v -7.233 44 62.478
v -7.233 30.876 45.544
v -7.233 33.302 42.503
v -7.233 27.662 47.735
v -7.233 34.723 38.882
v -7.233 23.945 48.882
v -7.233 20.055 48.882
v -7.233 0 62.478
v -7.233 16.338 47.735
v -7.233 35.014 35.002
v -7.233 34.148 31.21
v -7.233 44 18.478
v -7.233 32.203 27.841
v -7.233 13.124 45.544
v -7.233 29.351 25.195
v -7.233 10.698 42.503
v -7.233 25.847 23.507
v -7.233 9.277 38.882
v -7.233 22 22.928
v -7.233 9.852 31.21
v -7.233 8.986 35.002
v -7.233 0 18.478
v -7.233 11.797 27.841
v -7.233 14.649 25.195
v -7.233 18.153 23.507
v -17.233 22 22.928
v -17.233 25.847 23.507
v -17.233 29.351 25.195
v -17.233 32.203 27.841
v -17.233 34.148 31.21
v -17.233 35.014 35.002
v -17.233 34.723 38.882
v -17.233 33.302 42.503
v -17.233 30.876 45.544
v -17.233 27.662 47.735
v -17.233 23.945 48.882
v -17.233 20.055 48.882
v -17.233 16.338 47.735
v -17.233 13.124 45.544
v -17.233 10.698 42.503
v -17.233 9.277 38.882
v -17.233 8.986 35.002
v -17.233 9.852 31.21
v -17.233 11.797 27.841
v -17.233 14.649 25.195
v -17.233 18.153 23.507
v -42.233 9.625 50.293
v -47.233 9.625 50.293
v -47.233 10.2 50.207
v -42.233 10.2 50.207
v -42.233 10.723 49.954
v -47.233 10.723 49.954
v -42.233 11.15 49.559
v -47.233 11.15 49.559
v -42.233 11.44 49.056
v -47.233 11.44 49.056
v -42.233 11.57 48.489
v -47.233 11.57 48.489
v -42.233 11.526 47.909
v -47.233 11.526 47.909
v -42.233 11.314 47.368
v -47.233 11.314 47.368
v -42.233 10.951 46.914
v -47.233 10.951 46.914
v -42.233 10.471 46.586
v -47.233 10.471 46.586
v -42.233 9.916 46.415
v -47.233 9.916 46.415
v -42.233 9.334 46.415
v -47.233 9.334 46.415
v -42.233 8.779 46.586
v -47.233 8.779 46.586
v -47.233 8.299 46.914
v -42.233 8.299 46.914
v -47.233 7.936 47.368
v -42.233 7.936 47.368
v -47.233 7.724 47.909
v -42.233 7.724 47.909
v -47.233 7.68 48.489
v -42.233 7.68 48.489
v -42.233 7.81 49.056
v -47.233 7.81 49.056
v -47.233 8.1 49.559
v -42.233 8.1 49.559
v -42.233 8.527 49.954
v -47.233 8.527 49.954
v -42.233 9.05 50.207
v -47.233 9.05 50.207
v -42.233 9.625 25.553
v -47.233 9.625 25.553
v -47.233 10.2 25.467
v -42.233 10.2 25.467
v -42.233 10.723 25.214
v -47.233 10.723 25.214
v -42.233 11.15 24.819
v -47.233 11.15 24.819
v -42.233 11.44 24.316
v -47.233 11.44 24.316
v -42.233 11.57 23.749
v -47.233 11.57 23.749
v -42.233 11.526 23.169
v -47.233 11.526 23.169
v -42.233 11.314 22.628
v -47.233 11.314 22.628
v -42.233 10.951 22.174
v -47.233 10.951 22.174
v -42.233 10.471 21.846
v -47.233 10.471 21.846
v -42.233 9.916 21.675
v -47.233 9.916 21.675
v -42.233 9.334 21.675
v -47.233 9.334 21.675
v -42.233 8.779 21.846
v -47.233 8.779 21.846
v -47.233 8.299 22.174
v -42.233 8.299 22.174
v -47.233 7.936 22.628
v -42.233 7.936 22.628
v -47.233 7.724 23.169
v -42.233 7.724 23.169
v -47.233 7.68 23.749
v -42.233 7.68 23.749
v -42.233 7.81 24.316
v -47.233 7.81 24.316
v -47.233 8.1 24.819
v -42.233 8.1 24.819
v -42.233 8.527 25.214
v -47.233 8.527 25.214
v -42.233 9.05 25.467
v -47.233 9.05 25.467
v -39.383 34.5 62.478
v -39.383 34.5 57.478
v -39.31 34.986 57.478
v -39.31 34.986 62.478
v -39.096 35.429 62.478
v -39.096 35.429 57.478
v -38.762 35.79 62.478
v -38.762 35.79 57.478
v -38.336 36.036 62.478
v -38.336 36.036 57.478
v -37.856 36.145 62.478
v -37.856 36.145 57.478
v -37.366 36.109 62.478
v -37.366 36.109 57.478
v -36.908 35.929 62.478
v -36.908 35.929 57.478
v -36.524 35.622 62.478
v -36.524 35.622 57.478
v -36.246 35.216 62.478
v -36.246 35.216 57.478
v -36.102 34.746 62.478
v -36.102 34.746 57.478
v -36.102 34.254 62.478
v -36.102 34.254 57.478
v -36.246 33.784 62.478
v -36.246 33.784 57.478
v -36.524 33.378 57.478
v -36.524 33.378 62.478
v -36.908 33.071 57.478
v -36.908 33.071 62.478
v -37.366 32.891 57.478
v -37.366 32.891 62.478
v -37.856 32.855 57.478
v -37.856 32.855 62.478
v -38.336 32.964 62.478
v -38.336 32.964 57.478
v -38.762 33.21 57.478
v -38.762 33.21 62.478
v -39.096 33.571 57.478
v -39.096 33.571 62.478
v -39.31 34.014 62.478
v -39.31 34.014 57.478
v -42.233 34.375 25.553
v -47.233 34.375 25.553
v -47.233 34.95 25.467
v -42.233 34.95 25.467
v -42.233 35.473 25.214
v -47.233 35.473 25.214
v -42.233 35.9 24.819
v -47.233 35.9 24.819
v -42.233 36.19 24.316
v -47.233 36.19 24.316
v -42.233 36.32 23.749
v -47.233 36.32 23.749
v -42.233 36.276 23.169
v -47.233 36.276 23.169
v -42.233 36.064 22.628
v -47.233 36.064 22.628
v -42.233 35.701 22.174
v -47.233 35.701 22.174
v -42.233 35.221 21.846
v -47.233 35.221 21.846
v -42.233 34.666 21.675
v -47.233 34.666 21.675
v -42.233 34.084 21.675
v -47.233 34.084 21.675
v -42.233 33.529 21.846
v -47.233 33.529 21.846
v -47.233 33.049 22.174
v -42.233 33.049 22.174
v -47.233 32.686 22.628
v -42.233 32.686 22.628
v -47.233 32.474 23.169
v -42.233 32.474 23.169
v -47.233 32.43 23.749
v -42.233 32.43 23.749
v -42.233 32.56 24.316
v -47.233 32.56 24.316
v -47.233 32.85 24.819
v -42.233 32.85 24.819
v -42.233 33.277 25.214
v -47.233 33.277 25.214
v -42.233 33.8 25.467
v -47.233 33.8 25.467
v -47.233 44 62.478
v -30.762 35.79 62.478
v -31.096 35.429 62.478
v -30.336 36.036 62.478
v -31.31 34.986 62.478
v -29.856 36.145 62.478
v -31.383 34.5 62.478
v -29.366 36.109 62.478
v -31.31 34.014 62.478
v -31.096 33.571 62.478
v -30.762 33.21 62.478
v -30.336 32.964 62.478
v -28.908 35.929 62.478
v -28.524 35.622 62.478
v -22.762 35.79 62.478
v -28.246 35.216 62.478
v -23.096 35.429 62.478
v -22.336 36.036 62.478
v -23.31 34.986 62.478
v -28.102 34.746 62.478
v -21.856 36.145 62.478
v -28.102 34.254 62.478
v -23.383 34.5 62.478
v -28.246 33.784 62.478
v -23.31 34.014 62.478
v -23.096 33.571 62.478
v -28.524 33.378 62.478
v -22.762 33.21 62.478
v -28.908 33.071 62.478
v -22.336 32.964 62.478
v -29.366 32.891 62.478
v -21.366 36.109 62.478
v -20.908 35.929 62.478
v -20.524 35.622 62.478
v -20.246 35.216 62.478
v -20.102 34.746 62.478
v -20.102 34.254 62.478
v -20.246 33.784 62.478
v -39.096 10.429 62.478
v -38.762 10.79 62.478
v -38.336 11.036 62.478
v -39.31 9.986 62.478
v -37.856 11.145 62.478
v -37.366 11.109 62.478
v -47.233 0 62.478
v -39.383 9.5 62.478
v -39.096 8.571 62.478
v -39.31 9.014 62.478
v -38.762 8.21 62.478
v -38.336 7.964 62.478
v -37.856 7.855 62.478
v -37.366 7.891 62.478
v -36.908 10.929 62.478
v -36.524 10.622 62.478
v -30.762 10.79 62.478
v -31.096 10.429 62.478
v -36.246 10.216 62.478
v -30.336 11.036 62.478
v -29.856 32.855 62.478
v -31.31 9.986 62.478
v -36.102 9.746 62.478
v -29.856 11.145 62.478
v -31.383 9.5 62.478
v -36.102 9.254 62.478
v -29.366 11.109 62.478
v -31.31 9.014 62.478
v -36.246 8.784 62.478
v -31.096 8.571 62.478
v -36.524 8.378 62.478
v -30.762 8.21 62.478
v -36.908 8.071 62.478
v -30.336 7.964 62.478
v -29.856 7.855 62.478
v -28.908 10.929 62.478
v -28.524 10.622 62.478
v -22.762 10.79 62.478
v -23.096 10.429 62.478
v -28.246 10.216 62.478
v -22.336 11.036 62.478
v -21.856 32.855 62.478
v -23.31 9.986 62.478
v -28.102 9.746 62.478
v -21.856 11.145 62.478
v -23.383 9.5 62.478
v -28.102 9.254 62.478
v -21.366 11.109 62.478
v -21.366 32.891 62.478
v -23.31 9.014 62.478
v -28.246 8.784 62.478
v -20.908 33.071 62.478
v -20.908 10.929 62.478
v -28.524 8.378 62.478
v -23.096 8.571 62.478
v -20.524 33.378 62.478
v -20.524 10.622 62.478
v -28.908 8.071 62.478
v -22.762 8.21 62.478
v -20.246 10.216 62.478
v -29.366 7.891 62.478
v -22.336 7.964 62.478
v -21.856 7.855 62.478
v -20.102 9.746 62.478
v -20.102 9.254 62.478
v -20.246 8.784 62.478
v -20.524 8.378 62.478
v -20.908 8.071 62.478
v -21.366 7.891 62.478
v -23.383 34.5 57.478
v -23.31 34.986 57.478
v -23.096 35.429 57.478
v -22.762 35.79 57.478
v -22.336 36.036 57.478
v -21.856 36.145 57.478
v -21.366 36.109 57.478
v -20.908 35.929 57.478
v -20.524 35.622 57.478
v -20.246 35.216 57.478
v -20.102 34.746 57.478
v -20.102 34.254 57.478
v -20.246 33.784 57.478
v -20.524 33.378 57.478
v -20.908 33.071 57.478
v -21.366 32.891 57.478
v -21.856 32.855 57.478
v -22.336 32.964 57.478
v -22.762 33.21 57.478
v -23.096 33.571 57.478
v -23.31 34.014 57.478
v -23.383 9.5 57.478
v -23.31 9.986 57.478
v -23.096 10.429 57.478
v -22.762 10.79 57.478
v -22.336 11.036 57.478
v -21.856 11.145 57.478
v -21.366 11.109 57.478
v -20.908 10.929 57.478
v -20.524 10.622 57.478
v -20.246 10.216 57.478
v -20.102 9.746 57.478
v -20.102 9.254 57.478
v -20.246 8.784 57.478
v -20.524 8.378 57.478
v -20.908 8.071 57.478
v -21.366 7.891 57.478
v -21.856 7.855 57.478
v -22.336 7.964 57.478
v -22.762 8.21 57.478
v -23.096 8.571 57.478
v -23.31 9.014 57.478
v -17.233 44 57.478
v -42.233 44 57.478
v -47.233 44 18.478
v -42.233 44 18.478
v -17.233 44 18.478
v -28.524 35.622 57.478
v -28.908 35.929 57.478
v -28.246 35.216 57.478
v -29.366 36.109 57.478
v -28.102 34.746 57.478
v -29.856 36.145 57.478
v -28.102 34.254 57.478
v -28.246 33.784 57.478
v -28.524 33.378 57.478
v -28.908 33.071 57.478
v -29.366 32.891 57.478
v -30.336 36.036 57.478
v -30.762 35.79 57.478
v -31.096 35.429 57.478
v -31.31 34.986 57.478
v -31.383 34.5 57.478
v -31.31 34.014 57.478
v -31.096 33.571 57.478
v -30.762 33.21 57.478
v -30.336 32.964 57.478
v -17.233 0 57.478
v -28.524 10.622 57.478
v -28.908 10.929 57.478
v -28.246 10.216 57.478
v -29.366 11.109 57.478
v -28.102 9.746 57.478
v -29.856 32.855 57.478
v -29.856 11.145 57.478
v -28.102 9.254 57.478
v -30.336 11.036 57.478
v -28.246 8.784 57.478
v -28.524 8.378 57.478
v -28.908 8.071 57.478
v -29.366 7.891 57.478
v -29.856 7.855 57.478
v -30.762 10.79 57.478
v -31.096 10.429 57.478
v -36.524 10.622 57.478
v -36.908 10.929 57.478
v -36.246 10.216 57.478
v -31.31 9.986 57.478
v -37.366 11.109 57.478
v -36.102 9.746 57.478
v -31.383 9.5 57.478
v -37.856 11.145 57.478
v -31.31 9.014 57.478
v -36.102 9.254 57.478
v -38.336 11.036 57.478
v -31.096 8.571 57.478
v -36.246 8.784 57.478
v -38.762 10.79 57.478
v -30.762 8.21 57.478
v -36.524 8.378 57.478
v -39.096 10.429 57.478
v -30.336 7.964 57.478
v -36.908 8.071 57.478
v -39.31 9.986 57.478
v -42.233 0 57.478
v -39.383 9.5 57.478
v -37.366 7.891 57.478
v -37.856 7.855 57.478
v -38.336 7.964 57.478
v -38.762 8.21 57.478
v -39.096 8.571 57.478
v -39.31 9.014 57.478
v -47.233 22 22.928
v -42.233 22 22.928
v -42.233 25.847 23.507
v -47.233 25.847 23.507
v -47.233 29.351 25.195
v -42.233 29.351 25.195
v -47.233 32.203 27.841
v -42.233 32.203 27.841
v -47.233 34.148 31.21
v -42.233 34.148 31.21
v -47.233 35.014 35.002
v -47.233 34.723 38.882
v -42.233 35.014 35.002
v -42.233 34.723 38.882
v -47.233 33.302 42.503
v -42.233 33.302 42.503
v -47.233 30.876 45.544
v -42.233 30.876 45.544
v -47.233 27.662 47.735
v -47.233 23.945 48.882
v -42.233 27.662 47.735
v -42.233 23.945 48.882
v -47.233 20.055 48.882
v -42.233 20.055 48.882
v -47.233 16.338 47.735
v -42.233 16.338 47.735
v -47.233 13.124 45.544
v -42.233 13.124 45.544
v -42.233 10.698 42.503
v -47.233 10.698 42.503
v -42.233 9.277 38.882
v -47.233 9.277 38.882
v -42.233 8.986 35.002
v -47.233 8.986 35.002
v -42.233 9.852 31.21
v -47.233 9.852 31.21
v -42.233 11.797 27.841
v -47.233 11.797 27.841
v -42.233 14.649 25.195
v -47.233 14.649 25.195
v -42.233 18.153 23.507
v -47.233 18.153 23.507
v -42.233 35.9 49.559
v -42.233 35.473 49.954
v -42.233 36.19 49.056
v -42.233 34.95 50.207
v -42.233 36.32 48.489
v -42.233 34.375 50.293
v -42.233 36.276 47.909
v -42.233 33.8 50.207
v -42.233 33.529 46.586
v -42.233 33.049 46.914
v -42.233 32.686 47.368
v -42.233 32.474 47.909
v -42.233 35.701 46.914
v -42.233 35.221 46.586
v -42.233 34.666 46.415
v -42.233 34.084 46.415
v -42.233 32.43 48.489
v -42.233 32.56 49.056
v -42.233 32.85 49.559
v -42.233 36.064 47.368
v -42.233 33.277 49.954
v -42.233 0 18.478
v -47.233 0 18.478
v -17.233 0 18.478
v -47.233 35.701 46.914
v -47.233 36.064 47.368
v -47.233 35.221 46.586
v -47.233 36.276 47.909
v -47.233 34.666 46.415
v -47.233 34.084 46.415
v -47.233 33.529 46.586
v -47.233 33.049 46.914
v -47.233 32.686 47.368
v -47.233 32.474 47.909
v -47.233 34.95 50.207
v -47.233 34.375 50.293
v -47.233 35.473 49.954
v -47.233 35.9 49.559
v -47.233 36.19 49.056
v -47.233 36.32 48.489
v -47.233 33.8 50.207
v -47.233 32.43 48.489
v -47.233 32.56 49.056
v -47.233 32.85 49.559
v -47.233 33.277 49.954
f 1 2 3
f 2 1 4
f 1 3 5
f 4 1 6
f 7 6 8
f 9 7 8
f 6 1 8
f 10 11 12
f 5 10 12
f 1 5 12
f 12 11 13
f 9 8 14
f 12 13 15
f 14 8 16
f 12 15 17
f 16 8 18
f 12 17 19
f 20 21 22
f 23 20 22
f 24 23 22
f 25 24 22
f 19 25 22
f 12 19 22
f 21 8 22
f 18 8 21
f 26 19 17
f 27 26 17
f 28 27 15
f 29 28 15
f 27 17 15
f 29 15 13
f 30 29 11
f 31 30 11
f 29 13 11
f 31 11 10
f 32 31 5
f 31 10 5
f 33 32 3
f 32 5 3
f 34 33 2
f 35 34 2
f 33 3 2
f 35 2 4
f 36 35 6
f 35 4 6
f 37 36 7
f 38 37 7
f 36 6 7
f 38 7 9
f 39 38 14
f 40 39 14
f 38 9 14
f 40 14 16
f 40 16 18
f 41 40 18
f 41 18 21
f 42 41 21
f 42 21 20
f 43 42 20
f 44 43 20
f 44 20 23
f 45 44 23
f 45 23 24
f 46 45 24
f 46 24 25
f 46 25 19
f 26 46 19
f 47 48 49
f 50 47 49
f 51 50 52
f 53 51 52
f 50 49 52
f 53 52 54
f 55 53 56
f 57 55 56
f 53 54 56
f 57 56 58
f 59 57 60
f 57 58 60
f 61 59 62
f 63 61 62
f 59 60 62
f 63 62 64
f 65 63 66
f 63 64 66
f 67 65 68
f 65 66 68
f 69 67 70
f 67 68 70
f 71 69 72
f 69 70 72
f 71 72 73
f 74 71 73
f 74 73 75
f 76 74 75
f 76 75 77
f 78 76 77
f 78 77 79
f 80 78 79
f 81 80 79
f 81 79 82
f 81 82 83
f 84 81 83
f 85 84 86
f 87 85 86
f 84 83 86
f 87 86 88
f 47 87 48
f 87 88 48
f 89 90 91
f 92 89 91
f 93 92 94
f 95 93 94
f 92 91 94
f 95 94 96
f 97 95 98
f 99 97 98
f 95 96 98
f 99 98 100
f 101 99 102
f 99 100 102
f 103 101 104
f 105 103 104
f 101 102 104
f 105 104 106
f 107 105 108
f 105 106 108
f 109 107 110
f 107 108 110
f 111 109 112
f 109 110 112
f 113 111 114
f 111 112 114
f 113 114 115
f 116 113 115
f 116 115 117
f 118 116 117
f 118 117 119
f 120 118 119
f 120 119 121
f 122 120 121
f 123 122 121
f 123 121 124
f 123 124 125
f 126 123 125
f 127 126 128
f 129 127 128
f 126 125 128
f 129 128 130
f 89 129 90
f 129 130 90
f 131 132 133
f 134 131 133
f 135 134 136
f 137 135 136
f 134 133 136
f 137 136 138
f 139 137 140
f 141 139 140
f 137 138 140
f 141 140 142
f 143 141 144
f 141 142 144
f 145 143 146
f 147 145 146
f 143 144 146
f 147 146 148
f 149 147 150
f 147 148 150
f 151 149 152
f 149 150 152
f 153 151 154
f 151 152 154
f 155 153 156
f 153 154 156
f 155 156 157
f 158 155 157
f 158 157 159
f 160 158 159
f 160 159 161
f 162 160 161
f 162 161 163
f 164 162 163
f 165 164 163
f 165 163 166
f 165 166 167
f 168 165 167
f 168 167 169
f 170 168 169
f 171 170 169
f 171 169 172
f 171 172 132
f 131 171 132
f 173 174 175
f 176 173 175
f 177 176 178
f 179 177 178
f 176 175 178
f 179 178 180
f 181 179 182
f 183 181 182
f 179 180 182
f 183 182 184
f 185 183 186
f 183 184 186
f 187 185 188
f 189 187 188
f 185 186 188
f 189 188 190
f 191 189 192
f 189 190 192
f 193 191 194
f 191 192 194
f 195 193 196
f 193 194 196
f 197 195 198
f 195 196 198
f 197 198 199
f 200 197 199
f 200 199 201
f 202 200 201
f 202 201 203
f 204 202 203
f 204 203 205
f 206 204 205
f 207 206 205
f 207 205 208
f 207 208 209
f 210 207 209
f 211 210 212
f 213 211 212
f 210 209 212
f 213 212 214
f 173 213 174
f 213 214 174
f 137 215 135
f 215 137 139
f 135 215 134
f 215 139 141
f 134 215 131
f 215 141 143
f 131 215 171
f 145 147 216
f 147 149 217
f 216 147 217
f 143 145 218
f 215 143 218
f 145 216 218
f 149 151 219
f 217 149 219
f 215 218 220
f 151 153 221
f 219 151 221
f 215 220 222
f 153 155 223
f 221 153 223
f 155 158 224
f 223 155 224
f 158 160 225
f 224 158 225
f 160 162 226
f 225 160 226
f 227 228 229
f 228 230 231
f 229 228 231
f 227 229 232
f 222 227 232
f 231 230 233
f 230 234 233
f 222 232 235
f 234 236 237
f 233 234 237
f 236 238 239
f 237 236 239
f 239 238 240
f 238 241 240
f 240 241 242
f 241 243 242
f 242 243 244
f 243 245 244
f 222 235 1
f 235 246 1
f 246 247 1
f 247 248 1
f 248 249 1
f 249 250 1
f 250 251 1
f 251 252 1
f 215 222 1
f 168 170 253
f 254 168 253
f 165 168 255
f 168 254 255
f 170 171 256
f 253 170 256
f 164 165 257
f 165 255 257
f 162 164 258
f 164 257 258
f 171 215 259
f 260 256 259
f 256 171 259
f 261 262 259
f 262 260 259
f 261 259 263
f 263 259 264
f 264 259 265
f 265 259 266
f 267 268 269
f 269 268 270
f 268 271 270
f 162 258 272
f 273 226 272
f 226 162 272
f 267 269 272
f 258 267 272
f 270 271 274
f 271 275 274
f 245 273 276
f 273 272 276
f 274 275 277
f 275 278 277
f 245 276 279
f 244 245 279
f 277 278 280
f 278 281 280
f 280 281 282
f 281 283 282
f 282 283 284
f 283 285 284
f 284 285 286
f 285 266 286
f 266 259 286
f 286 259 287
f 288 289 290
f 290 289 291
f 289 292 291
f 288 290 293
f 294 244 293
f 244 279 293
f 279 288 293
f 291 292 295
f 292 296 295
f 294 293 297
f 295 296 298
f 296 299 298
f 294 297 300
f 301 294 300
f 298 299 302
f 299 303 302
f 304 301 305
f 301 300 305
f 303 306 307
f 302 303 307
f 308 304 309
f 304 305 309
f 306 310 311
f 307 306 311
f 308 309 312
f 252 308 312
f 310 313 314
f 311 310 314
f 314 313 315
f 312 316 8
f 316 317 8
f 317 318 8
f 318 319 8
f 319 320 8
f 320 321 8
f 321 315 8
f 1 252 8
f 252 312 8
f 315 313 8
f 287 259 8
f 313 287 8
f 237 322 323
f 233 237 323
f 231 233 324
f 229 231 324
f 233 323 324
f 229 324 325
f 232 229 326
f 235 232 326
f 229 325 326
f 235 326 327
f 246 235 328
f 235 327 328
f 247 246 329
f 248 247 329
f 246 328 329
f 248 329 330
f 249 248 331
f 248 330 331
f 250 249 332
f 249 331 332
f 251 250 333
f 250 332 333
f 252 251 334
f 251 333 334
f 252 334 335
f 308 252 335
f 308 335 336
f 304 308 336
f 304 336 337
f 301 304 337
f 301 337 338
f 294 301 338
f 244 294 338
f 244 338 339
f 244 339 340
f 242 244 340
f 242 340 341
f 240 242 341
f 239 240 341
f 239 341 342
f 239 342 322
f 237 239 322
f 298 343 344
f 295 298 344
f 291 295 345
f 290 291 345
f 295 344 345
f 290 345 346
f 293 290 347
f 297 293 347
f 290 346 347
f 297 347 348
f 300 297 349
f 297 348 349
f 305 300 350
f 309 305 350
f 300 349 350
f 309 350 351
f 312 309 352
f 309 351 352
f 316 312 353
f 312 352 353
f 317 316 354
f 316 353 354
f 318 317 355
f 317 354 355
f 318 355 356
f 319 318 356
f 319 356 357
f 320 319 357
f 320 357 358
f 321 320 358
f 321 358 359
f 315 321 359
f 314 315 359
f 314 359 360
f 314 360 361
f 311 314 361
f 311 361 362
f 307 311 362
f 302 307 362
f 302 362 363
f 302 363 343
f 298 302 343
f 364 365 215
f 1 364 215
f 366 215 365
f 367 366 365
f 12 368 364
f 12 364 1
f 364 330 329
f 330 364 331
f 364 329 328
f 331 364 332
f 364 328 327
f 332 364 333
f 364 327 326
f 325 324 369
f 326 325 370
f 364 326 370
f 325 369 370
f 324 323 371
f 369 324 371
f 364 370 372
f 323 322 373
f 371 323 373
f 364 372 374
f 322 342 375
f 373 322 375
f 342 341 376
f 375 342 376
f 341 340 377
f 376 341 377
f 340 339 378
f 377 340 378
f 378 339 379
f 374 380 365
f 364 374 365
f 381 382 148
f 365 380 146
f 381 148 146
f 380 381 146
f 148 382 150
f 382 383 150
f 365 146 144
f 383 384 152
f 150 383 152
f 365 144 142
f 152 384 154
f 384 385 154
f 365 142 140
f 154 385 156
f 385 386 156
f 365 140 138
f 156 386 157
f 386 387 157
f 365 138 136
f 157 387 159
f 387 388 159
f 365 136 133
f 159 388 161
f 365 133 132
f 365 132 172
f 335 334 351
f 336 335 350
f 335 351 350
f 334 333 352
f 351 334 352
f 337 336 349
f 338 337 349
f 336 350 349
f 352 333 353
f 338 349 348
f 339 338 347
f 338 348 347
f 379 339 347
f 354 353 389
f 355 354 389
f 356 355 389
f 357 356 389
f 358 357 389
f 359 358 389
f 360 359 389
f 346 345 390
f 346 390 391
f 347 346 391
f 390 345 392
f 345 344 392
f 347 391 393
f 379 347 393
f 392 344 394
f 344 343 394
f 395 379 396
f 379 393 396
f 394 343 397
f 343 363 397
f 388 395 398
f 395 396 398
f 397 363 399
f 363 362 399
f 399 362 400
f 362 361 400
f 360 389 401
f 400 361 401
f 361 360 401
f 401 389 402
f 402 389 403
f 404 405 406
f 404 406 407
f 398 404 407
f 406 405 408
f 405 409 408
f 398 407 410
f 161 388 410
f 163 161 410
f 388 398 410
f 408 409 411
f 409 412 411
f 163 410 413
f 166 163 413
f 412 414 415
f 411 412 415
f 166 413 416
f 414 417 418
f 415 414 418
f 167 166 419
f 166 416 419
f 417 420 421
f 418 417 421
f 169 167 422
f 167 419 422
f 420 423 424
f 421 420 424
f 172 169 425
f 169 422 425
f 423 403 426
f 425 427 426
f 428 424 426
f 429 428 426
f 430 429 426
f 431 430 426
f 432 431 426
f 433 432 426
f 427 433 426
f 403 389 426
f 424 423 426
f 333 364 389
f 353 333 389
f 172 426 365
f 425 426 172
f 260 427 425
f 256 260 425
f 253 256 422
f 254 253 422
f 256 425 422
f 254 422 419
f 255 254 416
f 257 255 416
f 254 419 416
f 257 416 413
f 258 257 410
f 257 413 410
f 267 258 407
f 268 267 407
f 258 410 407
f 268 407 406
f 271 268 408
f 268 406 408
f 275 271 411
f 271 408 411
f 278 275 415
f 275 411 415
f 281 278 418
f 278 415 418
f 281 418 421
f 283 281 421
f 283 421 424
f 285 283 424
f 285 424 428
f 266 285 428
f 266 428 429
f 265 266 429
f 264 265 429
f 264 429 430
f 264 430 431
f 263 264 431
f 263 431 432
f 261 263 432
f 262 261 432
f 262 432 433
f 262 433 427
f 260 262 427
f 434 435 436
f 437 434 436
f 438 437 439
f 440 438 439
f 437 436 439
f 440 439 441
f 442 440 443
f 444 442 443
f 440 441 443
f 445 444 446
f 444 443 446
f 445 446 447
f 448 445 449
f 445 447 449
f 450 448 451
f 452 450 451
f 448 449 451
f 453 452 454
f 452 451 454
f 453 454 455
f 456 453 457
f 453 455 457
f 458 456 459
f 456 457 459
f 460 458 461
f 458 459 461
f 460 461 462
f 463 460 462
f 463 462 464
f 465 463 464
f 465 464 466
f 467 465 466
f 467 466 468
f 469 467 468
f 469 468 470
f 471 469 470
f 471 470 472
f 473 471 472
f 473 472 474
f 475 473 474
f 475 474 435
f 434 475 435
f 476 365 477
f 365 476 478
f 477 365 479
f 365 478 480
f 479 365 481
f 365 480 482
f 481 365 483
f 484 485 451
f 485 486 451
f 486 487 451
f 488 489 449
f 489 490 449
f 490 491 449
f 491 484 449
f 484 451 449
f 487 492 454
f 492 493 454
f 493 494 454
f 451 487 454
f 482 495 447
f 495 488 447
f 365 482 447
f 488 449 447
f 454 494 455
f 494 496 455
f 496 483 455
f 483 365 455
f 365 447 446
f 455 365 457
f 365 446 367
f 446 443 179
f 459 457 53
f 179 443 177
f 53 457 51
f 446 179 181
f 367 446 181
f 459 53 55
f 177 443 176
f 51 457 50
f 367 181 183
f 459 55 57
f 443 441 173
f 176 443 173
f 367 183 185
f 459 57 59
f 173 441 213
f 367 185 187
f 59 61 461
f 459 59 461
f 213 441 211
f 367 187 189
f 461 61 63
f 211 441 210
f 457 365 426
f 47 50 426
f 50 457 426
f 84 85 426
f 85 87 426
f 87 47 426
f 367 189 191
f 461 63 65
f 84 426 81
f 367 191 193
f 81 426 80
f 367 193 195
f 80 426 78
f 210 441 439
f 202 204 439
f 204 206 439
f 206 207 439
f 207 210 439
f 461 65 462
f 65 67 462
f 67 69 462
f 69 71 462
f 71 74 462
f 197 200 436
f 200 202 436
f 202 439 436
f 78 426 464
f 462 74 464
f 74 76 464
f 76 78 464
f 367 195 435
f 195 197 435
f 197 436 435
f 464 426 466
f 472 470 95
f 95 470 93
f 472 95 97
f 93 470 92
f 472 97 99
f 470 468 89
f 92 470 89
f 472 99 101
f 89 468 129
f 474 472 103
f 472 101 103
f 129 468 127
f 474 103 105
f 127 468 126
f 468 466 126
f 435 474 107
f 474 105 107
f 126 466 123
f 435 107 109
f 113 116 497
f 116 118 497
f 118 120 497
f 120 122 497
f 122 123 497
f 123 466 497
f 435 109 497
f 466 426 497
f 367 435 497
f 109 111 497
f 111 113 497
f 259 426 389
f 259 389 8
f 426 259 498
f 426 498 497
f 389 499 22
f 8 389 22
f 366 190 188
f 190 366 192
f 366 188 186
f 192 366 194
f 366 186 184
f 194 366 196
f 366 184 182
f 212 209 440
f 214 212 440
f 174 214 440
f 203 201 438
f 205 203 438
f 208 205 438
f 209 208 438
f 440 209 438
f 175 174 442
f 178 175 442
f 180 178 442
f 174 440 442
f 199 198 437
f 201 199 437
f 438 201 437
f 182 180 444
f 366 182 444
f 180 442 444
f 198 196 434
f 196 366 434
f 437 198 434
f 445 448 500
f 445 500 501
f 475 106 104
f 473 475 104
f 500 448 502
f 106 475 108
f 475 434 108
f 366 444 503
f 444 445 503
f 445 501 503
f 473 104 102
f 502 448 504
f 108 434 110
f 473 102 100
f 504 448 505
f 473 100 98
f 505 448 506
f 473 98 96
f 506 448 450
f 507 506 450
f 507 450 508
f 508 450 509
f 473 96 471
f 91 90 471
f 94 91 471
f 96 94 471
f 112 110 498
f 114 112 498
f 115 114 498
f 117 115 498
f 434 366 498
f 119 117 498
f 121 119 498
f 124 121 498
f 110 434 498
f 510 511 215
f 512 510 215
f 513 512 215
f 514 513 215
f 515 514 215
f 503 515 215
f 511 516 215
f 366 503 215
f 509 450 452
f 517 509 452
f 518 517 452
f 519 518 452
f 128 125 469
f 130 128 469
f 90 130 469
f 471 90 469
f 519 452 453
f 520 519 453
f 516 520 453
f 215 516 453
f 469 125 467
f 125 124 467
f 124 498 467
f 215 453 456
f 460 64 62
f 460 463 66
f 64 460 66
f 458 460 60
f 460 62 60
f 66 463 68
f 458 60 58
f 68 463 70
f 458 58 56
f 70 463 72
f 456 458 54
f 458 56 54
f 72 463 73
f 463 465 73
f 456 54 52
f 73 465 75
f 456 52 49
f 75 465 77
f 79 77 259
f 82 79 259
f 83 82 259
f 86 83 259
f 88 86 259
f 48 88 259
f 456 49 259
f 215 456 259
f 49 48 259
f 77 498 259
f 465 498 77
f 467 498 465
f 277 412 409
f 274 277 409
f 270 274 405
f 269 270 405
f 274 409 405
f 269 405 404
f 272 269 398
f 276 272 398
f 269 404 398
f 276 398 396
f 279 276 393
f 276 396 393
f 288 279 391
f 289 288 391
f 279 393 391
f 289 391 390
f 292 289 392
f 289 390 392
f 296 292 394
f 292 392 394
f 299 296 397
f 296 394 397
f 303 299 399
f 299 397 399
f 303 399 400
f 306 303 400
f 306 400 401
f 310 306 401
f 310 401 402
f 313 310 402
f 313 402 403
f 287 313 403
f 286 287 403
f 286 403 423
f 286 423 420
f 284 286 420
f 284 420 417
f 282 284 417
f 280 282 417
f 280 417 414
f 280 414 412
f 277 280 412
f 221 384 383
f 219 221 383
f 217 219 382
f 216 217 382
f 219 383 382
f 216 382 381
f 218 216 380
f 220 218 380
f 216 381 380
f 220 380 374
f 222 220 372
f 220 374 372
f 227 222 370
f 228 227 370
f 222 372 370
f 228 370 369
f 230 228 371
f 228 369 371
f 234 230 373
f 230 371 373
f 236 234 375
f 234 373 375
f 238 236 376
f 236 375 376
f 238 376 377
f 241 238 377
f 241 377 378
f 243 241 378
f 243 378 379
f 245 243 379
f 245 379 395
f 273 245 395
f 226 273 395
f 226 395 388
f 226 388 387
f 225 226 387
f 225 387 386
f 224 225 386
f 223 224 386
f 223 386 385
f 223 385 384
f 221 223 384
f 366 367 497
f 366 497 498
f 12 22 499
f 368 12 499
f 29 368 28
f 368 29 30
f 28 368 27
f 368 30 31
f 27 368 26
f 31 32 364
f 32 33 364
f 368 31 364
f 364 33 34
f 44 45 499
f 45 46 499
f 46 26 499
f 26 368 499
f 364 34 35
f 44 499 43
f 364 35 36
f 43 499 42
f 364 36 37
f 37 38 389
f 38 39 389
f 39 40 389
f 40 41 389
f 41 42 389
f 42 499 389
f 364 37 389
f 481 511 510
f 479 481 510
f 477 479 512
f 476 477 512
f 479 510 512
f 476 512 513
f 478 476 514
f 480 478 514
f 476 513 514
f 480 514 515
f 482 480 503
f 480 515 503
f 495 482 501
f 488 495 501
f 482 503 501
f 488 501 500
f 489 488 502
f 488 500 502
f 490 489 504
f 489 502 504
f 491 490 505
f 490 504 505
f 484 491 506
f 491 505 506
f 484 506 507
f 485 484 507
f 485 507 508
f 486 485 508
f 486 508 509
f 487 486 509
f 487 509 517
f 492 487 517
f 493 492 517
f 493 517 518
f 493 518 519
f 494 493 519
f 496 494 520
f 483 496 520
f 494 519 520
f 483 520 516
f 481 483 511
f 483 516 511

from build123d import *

# Parameters (mm, degrees)
EXTRUDE_1_DEPTH     = 44
SKETCH_3_R          = 1.65
CUT_EXTRUDE_1_DEPTH = 44
SKETCH_6_R          = 1.95
CUT_EXTRUDE_5_DEPTH = 5
SKETCH_4_R          = 13.05
CUT_EXTRUDE_6_DEPTH = 53


with BuildPart() as part:
    # 草图1 → 凸台-拉伸1 (new body)
    with BuildSketch(Plane(origin=(0, 0, 0), x_dir=(1, 0, 0), z_dir=(0, 1, 0))):
        Polygon((-47.233094812, -18.47763864), (-47.233094812, -62.47763864), (-7.233094812, -62.47763864), (-7.233094812, -18.47763864), (-17.233094812, -18.47763864), (-17.233094812, -57.47763864), (-42.233094812, -57.47763864), (-42.233094812, -18.47763864), align=None)
    extrude(amount=EXTRUDE_1_DEPTH)

    # 草图3 → 切除-拉伸1 (cut)
    with BuildSketch(Plane(origin=(0, 0, 57.47763864), x_dir=(-1, 0, 0), z_dir=(0, 0, -1))):
        with Locations((37.733094812, 34.5)):
            Circle(SKETCH_3_R)
        with Locations((37.733094812, 9.5)):
            Circle(SKETCH_3_R)
        with Locations((29.733094812, 34.5)):
            Circle(SKETCH_3_R)
        with Locations((29.733094812, 9.5)):
            Circle(SKETCH_3_R)
        with Locations((21.733094812, 34.5)):
            Circle(SKETCH_3_R)
        with Locations((21.733094812, 9.5)):
            Circle(SKETCH_3_R)
    extrude(amount=-CUT_EXTRUDE_1_DEPTH, mode=Mode.SUBTRACT)

    # 草图6 → 切除-拉伸5 (cut)
    with BuildSketch(Plane.ZY.offset(47.233094812)):
        with Locations((48.34323864, 34.375)):
            Circle(SKETCH_6_R)
        with Locations((23.60323864, 34.375)):
            Circle(SKETCH_6_R)
        with Locations((48.34323864, 9.625)):
            Circle(SKETCH_6_R)
        with Locations((23.60323864, 9.625)):
            Circle(SKETCH_6_R)
    extrude(amount=-CUT_EXTRUDE_5_DEPTH, mode=Mode.SUBTRACT)

    # 草图4 → 切除-拉伸6 (cut)
    with BuildSketch(Plane(origin=(-7.233094812, 0, 0), x_dir=(0, 0, -1), z_dir=(1, 0, 0))):
        with Locations((-35.97763864, 22)):
            Circle(SKETCH_4_R)
    extrude(amount=-CUT_EXTRUDE_6_DEPTH, mode=Mode.SUBTRACT)


solid = part.part
